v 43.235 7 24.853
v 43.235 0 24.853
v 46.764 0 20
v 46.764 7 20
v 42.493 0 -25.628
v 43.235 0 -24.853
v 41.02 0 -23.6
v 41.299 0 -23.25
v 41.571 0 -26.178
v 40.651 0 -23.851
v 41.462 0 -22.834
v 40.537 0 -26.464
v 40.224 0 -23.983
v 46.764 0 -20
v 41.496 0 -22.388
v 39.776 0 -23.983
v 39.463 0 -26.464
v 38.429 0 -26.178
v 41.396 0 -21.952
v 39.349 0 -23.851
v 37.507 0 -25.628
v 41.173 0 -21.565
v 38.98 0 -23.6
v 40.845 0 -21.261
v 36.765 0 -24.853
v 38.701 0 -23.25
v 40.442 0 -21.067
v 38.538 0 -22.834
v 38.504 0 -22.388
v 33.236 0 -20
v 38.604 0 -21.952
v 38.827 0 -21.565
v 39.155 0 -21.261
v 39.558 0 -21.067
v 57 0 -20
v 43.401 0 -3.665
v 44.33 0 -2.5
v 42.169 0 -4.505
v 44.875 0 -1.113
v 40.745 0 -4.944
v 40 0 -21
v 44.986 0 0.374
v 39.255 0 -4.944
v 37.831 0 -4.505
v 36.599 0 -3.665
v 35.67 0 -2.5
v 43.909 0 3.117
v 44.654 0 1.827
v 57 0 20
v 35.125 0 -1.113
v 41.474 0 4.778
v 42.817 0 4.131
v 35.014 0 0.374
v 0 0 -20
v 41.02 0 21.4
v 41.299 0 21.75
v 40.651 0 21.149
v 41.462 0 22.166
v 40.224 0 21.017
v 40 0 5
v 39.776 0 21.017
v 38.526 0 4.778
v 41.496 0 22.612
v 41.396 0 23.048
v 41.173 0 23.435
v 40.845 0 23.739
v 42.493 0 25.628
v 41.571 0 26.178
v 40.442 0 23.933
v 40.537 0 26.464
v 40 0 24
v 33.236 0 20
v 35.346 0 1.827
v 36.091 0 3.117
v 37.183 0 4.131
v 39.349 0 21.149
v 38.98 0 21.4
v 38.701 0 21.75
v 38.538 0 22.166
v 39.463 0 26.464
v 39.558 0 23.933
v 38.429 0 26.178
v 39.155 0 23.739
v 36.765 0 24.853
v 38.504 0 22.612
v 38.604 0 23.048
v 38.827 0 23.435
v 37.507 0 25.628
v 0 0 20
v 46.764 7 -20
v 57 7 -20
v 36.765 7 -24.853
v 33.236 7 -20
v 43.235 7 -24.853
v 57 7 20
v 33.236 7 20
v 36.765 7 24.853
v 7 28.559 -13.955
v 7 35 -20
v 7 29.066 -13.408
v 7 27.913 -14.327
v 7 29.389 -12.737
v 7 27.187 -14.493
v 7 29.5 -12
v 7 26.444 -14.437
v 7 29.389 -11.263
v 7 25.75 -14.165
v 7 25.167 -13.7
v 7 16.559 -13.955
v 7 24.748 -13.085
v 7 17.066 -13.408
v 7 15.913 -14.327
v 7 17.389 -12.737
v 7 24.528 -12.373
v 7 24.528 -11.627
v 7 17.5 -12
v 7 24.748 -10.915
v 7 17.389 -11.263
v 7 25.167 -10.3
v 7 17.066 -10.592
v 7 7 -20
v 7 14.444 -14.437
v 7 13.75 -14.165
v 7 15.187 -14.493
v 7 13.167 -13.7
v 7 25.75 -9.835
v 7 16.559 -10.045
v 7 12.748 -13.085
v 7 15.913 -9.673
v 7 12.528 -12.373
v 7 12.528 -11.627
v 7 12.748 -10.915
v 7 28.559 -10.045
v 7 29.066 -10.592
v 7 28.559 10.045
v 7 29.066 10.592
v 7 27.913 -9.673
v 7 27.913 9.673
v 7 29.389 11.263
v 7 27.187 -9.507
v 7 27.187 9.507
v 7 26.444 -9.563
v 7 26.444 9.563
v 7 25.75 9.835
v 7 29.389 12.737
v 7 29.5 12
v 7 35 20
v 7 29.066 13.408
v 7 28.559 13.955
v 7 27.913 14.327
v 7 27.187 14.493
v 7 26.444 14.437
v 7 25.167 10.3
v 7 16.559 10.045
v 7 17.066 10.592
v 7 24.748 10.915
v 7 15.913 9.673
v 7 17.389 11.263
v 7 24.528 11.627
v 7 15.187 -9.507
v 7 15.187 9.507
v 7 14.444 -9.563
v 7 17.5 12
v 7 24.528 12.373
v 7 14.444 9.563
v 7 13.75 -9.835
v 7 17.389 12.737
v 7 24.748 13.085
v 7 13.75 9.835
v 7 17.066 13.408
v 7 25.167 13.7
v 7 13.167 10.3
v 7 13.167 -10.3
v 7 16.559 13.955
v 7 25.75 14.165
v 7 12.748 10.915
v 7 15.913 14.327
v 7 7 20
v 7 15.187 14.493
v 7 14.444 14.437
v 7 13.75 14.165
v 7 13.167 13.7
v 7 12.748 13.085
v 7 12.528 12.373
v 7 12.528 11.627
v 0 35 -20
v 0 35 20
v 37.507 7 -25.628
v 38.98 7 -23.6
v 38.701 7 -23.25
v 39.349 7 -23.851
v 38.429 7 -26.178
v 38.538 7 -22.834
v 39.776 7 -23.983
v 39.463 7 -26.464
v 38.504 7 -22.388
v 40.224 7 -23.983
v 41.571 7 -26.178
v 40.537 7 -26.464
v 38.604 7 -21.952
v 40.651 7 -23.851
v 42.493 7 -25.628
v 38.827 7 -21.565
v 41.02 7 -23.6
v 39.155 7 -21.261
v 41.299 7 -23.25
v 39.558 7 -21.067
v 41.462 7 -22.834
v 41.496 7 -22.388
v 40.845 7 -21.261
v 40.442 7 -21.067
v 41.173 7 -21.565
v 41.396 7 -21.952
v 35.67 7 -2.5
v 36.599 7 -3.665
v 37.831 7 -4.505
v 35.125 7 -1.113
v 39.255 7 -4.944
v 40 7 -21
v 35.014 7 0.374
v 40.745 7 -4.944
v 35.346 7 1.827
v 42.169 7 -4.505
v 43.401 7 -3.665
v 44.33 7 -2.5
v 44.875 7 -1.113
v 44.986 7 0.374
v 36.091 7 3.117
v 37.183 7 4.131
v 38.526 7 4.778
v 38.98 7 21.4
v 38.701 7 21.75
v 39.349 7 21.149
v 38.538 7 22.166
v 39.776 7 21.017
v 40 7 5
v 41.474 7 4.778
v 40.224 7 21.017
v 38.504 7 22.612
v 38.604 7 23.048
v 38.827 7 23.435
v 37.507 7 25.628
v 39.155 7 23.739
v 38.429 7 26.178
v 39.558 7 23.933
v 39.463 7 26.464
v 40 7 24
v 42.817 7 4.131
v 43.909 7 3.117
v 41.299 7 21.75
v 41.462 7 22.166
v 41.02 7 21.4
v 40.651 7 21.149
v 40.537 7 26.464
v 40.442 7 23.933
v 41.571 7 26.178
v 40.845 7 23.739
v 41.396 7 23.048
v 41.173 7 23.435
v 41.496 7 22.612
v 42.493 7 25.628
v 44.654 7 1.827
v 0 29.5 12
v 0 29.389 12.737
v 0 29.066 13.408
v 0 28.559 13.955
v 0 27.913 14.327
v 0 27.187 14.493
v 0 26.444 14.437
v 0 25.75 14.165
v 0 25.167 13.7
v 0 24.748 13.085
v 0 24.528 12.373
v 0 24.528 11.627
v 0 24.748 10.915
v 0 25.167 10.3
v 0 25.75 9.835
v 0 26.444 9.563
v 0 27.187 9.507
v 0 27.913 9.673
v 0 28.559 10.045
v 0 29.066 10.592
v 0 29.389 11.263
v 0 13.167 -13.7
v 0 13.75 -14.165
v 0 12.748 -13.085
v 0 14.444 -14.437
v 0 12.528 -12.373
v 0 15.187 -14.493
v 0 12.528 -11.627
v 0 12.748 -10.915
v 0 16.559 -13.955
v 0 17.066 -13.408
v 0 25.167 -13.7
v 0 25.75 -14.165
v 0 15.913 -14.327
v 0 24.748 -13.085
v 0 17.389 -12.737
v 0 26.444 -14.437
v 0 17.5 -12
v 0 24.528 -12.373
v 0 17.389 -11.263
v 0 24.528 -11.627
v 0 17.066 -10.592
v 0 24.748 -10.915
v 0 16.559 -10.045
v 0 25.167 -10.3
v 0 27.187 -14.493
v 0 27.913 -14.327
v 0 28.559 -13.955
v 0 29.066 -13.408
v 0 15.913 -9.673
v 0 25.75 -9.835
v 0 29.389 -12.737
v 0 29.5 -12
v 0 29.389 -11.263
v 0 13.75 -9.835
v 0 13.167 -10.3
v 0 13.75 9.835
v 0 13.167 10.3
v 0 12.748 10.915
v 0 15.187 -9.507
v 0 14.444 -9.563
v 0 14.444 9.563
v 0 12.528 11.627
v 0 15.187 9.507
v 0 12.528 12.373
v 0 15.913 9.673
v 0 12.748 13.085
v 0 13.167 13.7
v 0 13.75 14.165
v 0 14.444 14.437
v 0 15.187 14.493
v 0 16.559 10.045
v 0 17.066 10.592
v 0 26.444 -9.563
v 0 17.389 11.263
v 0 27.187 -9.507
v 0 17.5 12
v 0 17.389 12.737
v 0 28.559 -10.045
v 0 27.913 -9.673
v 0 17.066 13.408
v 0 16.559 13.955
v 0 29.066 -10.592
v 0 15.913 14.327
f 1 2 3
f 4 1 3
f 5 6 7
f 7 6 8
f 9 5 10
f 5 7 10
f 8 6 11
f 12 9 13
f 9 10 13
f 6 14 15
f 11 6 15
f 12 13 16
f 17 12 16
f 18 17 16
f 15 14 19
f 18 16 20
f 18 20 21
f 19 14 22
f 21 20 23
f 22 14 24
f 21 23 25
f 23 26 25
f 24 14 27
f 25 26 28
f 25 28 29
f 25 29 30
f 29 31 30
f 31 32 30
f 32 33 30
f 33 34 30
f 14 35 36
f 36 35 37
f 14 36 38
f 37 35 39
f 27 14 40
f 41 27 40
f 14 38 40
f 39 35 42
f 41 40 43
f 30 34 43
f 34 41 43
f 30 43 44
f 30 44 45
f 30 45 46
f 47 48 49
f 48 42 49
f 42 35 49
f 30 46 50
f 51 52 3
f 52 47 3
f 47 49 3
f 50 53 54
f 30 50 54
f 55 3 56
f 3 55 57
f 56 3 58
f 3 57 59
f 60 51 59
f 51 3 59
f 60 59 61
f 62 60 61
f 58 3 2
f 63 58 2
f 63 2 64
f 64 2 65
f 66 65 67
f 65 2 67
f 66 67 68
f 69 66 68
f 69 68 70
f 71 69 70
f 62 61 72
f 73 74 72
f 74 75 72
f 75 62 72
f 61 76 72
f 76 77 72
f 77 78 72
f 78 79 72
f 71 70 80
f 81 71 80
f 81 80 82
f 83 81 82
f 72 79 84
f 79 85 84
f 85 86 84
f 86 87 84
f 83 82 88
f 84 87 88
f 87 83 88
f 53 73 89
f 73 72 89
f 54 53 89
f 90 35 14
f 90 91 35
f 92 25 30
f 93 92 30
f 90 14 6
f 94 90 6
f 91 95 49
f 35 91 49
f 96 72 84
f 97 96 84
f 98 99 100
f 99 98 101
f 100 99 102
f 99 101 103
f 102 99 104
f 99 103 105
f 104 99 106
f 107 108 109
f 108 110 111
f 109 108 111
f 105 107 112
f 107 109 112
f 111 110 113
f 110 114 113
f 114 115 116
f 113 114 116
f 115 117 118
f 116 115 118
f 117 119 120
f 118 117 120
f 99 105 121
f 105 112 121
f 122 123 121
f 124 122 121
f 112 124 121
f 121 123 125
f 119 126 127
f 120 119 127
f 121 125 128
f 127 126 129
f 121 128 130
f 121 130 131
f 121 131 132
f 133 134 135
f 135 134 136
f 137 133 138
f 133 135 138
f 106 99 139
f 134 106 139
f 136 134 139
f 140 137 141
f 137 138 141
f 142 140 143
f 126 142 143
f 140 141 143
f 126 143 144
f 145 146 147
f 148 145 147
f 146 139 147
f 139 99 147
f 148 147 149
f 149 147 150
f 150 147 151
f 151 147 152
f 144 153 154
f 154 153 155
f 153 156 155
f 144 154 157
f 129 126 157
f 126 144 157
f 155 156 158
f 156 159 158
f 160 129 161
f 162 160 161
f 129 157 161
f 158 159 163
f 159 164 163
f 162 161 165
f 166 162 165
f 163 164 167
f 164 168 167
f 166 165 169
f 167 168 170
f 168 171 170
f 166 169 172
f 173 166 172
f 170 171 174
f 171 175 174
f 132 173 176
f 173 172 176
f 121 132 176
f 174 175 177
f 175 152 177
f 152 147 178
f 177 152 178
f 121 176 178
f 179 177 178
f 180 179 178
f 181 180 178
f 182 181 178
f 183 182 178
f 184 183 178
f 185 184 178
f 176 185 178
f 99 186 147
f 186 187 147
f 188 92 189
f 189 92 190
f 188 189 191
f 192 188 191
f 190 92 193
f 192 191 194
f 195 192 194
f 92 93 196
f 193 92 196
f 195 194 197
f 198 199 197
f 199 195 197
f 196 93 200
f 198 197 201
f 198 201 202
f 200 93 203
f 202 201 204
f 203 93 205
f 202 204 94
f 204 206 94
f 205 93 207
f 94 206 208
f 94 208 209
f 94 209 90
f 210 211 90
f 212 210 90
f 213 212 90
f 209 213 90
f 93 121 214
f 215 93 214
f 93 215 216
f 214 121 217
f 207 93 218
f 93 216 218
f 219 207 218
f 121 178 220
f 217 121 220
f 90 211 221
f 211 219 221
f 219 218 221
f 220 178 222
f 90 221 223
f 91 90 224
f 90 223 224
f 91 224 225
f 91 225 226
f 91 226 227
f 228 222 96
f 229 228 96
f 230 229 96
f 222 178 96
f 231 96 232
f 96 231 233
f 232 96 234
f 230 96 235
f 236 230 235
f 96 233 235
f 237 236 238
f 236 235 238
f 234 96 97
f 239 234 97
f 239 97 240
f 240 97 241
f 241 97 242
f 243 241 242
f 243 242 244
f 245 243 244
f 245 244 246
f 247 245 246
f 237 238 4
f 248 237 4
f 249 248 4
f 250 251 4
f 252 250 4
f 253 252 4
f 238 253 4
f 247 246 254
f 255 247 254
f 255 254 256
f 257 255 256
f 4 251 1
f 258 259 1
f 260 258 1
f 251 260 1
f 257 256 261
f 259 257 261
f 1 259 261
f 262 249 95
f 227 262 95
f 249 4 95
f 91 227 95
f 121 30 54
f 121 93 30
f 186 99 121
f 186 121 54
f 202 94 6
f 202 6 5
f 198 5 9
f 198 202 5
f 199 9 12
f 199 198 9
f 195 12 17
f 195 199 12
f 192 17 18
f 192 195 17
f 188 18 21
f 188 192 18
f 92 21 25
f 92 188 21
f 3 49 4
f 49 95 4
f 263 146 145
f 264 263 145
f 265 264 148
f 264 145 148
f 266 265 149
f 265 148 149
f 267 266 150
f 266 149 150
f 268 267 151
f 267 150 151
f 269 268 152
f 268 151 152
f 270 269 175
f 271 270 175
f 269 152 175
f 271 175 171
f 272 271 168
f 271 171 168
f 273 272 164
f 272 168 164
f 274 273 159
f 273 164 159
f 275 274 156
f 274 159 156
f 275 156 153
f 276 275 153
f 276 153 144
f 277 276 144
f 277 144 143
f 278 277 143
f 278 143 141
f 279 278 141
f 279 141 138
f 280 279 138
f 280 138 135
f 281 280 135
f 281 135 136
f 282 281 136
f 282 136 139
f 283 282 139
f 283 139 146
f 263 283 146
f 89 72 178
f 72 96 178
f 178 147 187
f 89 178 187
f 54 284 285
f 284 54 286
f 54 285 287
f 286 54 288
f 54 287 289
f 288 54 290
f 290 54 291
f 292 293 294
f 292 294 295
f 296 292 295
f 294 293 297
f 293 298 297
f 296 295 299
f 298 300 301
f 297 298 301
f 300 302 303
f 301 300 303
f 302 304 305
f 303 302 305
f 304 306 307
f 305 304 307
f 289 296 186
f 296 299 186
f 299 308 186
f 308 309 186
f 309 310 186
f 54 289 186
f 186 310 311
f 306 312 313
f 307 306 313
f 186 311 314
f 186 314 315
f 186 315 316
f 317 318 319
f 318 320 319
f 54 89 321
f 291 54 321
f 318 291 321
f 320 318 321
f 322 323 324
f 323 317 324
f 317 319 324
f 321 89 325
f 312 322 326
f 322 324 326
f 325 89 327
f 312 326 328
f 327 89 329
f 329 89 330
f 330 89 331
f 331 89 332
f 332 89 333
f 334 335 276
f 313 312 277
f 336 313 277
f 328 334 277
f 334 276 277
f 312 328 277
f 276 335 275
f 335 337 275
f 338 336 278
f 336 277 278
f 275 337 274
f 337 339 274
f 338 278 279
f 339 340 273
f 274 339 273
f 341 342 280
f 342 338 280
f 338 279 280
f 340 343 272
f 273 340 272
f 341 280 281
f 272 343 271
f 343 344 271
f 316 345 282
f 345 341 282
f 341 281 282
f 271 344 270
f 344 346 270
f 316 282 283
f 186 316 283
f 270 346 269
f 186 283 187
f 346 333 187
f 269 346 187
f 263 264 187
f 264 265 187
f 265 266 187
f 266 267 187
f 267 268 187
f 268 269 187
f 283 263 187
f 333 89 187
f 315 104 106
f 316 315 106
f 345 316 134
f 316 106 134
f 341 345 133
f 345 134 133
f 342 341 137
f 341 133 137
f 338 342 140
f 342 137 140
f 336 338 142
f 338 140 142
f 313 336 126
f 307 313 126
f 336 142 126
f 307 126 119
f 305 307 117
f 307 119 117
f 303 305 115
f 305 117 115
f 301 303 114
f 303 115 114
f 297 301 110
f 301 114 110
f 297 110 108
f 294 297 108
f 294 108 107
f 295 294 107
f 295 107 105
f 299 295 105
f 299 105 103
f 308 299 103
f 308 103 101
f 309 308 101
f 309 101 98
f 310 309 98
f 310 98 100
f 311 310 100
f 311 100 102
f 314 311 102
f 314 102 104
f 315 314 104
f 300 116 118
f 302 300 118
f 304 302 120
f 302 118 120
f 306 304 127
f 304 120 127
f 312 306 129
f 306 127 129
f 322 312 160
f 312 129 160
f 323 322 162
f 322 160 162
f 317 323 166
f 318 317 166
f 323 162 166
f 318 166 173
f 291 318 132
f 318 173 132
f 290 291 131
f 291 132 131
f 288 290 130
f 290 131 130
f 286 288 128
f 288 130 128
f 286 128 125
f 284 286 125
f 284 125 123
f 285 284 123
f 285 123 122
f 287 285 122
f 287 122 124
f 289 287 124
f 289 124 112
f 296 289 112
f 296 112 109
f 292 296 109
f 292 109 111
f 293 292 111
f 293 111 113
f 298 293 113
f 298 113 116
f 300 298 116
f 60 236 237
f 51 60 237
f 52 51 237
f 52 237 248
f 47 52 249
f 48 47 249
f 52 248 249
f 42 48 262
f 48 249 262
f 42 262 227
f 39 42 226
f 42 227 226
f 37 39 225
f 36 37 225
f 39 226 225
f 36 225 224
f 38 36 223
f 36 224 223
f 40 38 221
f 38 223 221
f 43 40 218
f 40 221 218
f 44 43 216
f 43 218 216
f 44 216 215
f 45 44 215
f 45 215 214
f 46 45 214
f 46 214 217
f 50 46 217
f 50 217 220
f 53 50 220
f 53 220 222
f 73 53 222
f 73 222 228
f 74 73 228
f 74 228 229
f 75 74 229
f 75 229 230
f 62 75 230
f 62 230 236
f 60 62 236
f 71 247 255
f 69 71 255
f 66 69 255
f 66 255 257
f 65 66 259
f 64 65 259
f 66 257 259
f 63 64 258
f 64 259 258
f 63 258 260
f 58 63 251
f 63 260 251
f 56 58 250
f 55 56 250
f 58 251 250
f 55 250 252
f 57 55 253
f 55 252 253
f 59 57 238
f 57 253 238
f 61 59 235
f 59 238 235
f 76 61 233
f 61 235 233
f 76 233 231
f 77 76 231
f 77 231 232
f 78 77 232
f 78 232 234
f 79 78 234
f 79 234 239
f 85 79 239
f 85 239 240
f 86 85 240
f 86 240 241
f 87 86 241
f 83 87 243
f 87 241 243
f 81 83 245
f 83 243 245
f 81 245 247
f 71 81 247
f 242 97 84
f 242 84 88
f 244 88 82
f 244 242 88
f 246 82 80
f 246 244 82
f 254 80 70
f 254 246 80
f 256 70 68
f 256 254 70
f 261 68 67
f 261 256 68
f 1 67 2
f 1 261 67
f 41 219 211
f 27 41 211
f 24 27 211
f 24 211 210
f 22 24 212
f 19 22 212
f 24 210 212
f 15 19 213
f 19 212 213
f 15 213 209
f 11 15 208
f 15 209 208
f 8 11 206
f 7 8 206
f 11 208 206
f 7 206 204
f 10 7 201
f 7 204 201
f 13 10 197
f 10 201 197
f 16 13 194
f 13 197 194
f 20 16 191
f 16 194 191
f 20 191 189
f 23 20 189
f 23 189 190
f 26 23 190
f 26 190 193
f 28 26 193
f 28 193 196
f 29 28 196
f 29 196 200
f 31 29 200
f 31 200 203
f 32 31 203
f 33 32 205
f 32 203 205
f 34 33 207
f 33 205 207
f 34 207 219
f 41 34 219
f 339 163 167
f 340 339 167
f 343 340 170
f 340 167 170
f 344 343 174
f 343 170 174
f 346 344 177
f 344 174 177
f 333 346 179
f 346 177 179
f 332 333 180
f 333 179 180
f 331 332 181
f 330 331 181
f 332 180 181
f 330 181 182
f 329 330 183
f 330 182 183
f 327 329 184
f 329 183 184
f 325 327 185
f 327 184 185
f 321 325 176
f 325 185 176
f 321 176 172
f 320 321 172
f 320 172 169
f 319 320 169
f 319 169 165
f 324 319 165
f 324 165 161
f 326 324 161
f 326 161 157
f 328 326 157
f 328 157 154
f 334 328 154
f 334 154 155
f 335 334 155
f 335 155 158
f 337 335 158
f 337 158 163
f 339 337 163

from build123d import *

# Parameters (mm, degrees)
BOSS_EXTRUDE1_DEPTH = 20
SKETCH2_R           = 5
CUT_EXTRUDE1_DEPTH  = 67.580778007
SKETCH3_R           = 2.5
CUT_EXTRUDE2_DEPTH  = 65.226162893
SKETCH4_R           = 1.5
BOSS_EXTRUDE2_DEPTH = 7


with BuildPart() as part:
    # Sketch1 → Boss-Extrude1 (new, symmetric)
    with BuildSketch(Plane.XY):
        Polygon((0, 0), (0, 35), (7, 35), (7, 7), (57, 7), (57, 0), align=None)
    extrude(amount=BOSS_EXTRUDE1_DEPTH, both=True)

    # Sketch2 → Cut-Extrude1 (cut, through all)
    with BuildSketch(Plane(origin=(0, 7, 0), x_dir=(1, 0, 0), z_dir=(0, 1, 0))):
        with Locations(Location((40, 0, 0), (0, 0, 270))):
            Circle(SKETCH2_R)
    extrude(amount=-CUT_EXTRUDE1_DEPTH, mode=Mode.SUBTRACT)

    # Sketch3 → Cut-Extrude2 (cut, through all)
    with BuildSketch(Plane(origin=(7, 0, 0), x_dir=(0, 0, -1), z_dir=(1, 0, 0))):
        with Locations(Location((12, 27, 0), (0, 0, 90))):
            Circle(SKETCH3_R)
        with Locations(Location((12, 15, 0), (0, 0, 90))):
            Circle(SKETCH3_R)
        with Locations(Location((-12, 27, 0), (0, 0, 90))):
            Circle(SKETCH3_R)
        with Locations(Location((-12, 15, 0), (0, 0, 90))):
            Circle(SKETCH3_R)
    extrude(amount=-CUT_EXTRUDE2_DEPTH, mode=Mode.SUBTRACT)

    # Sketch4 → Boss-Extrude2 (add)
    # profile 1 of 2: a face of its own
    with BuildSketch(Plane(origin=(0, 7, 0), x_dir=(1, 0, 0), z_dir=(0, 1, 0))):
        with BuildLine():
            Line((36.764961653, 24.852557521), (33.236125371, 20))
            Line((33.236125371, 20), (46.763874629, 20))
            Line((46.763874629, 20), (43.235038347, 24.852557521))
            ThreePointArc((43.235038347, 24.852557521), (40, 26.5), (36.764961653, 24.852557521))
        make_face()
        with Locations(Location((40, 22.5, 0), (0, 0, 270))):
            Circle(SKETCH4_R, mode=Mode.SUBTRACT)
    # profile 2 of 2: a face of its own
    with BuildSketch(Plane(origin=(0, 7, 0), x_dir=(1, 0, 0), z_dir=(0, 1, 0))):
        with BuildLine():
            Line((43.235038347, -24.852557521), (46.763874629, -20))
            Line((46.763874629, -20), (33.236125371, -20))
            Line((33.236125371, -20), (36.764961653, -24.852557521))
            ThreePointArc((36.764961653, -24.852557521), (40, -26.5), (43.235038347, -24.852557521))
        make_face()
        with Locations(Location((40, -22.5, 0), (0, 0, 270))):
            Circle(SKETCH4_R, mode=Mode.SUBTRACT)
    extrude(amount=-BOSS_EXTRUDE2_DEPTH)


solid = part.part
